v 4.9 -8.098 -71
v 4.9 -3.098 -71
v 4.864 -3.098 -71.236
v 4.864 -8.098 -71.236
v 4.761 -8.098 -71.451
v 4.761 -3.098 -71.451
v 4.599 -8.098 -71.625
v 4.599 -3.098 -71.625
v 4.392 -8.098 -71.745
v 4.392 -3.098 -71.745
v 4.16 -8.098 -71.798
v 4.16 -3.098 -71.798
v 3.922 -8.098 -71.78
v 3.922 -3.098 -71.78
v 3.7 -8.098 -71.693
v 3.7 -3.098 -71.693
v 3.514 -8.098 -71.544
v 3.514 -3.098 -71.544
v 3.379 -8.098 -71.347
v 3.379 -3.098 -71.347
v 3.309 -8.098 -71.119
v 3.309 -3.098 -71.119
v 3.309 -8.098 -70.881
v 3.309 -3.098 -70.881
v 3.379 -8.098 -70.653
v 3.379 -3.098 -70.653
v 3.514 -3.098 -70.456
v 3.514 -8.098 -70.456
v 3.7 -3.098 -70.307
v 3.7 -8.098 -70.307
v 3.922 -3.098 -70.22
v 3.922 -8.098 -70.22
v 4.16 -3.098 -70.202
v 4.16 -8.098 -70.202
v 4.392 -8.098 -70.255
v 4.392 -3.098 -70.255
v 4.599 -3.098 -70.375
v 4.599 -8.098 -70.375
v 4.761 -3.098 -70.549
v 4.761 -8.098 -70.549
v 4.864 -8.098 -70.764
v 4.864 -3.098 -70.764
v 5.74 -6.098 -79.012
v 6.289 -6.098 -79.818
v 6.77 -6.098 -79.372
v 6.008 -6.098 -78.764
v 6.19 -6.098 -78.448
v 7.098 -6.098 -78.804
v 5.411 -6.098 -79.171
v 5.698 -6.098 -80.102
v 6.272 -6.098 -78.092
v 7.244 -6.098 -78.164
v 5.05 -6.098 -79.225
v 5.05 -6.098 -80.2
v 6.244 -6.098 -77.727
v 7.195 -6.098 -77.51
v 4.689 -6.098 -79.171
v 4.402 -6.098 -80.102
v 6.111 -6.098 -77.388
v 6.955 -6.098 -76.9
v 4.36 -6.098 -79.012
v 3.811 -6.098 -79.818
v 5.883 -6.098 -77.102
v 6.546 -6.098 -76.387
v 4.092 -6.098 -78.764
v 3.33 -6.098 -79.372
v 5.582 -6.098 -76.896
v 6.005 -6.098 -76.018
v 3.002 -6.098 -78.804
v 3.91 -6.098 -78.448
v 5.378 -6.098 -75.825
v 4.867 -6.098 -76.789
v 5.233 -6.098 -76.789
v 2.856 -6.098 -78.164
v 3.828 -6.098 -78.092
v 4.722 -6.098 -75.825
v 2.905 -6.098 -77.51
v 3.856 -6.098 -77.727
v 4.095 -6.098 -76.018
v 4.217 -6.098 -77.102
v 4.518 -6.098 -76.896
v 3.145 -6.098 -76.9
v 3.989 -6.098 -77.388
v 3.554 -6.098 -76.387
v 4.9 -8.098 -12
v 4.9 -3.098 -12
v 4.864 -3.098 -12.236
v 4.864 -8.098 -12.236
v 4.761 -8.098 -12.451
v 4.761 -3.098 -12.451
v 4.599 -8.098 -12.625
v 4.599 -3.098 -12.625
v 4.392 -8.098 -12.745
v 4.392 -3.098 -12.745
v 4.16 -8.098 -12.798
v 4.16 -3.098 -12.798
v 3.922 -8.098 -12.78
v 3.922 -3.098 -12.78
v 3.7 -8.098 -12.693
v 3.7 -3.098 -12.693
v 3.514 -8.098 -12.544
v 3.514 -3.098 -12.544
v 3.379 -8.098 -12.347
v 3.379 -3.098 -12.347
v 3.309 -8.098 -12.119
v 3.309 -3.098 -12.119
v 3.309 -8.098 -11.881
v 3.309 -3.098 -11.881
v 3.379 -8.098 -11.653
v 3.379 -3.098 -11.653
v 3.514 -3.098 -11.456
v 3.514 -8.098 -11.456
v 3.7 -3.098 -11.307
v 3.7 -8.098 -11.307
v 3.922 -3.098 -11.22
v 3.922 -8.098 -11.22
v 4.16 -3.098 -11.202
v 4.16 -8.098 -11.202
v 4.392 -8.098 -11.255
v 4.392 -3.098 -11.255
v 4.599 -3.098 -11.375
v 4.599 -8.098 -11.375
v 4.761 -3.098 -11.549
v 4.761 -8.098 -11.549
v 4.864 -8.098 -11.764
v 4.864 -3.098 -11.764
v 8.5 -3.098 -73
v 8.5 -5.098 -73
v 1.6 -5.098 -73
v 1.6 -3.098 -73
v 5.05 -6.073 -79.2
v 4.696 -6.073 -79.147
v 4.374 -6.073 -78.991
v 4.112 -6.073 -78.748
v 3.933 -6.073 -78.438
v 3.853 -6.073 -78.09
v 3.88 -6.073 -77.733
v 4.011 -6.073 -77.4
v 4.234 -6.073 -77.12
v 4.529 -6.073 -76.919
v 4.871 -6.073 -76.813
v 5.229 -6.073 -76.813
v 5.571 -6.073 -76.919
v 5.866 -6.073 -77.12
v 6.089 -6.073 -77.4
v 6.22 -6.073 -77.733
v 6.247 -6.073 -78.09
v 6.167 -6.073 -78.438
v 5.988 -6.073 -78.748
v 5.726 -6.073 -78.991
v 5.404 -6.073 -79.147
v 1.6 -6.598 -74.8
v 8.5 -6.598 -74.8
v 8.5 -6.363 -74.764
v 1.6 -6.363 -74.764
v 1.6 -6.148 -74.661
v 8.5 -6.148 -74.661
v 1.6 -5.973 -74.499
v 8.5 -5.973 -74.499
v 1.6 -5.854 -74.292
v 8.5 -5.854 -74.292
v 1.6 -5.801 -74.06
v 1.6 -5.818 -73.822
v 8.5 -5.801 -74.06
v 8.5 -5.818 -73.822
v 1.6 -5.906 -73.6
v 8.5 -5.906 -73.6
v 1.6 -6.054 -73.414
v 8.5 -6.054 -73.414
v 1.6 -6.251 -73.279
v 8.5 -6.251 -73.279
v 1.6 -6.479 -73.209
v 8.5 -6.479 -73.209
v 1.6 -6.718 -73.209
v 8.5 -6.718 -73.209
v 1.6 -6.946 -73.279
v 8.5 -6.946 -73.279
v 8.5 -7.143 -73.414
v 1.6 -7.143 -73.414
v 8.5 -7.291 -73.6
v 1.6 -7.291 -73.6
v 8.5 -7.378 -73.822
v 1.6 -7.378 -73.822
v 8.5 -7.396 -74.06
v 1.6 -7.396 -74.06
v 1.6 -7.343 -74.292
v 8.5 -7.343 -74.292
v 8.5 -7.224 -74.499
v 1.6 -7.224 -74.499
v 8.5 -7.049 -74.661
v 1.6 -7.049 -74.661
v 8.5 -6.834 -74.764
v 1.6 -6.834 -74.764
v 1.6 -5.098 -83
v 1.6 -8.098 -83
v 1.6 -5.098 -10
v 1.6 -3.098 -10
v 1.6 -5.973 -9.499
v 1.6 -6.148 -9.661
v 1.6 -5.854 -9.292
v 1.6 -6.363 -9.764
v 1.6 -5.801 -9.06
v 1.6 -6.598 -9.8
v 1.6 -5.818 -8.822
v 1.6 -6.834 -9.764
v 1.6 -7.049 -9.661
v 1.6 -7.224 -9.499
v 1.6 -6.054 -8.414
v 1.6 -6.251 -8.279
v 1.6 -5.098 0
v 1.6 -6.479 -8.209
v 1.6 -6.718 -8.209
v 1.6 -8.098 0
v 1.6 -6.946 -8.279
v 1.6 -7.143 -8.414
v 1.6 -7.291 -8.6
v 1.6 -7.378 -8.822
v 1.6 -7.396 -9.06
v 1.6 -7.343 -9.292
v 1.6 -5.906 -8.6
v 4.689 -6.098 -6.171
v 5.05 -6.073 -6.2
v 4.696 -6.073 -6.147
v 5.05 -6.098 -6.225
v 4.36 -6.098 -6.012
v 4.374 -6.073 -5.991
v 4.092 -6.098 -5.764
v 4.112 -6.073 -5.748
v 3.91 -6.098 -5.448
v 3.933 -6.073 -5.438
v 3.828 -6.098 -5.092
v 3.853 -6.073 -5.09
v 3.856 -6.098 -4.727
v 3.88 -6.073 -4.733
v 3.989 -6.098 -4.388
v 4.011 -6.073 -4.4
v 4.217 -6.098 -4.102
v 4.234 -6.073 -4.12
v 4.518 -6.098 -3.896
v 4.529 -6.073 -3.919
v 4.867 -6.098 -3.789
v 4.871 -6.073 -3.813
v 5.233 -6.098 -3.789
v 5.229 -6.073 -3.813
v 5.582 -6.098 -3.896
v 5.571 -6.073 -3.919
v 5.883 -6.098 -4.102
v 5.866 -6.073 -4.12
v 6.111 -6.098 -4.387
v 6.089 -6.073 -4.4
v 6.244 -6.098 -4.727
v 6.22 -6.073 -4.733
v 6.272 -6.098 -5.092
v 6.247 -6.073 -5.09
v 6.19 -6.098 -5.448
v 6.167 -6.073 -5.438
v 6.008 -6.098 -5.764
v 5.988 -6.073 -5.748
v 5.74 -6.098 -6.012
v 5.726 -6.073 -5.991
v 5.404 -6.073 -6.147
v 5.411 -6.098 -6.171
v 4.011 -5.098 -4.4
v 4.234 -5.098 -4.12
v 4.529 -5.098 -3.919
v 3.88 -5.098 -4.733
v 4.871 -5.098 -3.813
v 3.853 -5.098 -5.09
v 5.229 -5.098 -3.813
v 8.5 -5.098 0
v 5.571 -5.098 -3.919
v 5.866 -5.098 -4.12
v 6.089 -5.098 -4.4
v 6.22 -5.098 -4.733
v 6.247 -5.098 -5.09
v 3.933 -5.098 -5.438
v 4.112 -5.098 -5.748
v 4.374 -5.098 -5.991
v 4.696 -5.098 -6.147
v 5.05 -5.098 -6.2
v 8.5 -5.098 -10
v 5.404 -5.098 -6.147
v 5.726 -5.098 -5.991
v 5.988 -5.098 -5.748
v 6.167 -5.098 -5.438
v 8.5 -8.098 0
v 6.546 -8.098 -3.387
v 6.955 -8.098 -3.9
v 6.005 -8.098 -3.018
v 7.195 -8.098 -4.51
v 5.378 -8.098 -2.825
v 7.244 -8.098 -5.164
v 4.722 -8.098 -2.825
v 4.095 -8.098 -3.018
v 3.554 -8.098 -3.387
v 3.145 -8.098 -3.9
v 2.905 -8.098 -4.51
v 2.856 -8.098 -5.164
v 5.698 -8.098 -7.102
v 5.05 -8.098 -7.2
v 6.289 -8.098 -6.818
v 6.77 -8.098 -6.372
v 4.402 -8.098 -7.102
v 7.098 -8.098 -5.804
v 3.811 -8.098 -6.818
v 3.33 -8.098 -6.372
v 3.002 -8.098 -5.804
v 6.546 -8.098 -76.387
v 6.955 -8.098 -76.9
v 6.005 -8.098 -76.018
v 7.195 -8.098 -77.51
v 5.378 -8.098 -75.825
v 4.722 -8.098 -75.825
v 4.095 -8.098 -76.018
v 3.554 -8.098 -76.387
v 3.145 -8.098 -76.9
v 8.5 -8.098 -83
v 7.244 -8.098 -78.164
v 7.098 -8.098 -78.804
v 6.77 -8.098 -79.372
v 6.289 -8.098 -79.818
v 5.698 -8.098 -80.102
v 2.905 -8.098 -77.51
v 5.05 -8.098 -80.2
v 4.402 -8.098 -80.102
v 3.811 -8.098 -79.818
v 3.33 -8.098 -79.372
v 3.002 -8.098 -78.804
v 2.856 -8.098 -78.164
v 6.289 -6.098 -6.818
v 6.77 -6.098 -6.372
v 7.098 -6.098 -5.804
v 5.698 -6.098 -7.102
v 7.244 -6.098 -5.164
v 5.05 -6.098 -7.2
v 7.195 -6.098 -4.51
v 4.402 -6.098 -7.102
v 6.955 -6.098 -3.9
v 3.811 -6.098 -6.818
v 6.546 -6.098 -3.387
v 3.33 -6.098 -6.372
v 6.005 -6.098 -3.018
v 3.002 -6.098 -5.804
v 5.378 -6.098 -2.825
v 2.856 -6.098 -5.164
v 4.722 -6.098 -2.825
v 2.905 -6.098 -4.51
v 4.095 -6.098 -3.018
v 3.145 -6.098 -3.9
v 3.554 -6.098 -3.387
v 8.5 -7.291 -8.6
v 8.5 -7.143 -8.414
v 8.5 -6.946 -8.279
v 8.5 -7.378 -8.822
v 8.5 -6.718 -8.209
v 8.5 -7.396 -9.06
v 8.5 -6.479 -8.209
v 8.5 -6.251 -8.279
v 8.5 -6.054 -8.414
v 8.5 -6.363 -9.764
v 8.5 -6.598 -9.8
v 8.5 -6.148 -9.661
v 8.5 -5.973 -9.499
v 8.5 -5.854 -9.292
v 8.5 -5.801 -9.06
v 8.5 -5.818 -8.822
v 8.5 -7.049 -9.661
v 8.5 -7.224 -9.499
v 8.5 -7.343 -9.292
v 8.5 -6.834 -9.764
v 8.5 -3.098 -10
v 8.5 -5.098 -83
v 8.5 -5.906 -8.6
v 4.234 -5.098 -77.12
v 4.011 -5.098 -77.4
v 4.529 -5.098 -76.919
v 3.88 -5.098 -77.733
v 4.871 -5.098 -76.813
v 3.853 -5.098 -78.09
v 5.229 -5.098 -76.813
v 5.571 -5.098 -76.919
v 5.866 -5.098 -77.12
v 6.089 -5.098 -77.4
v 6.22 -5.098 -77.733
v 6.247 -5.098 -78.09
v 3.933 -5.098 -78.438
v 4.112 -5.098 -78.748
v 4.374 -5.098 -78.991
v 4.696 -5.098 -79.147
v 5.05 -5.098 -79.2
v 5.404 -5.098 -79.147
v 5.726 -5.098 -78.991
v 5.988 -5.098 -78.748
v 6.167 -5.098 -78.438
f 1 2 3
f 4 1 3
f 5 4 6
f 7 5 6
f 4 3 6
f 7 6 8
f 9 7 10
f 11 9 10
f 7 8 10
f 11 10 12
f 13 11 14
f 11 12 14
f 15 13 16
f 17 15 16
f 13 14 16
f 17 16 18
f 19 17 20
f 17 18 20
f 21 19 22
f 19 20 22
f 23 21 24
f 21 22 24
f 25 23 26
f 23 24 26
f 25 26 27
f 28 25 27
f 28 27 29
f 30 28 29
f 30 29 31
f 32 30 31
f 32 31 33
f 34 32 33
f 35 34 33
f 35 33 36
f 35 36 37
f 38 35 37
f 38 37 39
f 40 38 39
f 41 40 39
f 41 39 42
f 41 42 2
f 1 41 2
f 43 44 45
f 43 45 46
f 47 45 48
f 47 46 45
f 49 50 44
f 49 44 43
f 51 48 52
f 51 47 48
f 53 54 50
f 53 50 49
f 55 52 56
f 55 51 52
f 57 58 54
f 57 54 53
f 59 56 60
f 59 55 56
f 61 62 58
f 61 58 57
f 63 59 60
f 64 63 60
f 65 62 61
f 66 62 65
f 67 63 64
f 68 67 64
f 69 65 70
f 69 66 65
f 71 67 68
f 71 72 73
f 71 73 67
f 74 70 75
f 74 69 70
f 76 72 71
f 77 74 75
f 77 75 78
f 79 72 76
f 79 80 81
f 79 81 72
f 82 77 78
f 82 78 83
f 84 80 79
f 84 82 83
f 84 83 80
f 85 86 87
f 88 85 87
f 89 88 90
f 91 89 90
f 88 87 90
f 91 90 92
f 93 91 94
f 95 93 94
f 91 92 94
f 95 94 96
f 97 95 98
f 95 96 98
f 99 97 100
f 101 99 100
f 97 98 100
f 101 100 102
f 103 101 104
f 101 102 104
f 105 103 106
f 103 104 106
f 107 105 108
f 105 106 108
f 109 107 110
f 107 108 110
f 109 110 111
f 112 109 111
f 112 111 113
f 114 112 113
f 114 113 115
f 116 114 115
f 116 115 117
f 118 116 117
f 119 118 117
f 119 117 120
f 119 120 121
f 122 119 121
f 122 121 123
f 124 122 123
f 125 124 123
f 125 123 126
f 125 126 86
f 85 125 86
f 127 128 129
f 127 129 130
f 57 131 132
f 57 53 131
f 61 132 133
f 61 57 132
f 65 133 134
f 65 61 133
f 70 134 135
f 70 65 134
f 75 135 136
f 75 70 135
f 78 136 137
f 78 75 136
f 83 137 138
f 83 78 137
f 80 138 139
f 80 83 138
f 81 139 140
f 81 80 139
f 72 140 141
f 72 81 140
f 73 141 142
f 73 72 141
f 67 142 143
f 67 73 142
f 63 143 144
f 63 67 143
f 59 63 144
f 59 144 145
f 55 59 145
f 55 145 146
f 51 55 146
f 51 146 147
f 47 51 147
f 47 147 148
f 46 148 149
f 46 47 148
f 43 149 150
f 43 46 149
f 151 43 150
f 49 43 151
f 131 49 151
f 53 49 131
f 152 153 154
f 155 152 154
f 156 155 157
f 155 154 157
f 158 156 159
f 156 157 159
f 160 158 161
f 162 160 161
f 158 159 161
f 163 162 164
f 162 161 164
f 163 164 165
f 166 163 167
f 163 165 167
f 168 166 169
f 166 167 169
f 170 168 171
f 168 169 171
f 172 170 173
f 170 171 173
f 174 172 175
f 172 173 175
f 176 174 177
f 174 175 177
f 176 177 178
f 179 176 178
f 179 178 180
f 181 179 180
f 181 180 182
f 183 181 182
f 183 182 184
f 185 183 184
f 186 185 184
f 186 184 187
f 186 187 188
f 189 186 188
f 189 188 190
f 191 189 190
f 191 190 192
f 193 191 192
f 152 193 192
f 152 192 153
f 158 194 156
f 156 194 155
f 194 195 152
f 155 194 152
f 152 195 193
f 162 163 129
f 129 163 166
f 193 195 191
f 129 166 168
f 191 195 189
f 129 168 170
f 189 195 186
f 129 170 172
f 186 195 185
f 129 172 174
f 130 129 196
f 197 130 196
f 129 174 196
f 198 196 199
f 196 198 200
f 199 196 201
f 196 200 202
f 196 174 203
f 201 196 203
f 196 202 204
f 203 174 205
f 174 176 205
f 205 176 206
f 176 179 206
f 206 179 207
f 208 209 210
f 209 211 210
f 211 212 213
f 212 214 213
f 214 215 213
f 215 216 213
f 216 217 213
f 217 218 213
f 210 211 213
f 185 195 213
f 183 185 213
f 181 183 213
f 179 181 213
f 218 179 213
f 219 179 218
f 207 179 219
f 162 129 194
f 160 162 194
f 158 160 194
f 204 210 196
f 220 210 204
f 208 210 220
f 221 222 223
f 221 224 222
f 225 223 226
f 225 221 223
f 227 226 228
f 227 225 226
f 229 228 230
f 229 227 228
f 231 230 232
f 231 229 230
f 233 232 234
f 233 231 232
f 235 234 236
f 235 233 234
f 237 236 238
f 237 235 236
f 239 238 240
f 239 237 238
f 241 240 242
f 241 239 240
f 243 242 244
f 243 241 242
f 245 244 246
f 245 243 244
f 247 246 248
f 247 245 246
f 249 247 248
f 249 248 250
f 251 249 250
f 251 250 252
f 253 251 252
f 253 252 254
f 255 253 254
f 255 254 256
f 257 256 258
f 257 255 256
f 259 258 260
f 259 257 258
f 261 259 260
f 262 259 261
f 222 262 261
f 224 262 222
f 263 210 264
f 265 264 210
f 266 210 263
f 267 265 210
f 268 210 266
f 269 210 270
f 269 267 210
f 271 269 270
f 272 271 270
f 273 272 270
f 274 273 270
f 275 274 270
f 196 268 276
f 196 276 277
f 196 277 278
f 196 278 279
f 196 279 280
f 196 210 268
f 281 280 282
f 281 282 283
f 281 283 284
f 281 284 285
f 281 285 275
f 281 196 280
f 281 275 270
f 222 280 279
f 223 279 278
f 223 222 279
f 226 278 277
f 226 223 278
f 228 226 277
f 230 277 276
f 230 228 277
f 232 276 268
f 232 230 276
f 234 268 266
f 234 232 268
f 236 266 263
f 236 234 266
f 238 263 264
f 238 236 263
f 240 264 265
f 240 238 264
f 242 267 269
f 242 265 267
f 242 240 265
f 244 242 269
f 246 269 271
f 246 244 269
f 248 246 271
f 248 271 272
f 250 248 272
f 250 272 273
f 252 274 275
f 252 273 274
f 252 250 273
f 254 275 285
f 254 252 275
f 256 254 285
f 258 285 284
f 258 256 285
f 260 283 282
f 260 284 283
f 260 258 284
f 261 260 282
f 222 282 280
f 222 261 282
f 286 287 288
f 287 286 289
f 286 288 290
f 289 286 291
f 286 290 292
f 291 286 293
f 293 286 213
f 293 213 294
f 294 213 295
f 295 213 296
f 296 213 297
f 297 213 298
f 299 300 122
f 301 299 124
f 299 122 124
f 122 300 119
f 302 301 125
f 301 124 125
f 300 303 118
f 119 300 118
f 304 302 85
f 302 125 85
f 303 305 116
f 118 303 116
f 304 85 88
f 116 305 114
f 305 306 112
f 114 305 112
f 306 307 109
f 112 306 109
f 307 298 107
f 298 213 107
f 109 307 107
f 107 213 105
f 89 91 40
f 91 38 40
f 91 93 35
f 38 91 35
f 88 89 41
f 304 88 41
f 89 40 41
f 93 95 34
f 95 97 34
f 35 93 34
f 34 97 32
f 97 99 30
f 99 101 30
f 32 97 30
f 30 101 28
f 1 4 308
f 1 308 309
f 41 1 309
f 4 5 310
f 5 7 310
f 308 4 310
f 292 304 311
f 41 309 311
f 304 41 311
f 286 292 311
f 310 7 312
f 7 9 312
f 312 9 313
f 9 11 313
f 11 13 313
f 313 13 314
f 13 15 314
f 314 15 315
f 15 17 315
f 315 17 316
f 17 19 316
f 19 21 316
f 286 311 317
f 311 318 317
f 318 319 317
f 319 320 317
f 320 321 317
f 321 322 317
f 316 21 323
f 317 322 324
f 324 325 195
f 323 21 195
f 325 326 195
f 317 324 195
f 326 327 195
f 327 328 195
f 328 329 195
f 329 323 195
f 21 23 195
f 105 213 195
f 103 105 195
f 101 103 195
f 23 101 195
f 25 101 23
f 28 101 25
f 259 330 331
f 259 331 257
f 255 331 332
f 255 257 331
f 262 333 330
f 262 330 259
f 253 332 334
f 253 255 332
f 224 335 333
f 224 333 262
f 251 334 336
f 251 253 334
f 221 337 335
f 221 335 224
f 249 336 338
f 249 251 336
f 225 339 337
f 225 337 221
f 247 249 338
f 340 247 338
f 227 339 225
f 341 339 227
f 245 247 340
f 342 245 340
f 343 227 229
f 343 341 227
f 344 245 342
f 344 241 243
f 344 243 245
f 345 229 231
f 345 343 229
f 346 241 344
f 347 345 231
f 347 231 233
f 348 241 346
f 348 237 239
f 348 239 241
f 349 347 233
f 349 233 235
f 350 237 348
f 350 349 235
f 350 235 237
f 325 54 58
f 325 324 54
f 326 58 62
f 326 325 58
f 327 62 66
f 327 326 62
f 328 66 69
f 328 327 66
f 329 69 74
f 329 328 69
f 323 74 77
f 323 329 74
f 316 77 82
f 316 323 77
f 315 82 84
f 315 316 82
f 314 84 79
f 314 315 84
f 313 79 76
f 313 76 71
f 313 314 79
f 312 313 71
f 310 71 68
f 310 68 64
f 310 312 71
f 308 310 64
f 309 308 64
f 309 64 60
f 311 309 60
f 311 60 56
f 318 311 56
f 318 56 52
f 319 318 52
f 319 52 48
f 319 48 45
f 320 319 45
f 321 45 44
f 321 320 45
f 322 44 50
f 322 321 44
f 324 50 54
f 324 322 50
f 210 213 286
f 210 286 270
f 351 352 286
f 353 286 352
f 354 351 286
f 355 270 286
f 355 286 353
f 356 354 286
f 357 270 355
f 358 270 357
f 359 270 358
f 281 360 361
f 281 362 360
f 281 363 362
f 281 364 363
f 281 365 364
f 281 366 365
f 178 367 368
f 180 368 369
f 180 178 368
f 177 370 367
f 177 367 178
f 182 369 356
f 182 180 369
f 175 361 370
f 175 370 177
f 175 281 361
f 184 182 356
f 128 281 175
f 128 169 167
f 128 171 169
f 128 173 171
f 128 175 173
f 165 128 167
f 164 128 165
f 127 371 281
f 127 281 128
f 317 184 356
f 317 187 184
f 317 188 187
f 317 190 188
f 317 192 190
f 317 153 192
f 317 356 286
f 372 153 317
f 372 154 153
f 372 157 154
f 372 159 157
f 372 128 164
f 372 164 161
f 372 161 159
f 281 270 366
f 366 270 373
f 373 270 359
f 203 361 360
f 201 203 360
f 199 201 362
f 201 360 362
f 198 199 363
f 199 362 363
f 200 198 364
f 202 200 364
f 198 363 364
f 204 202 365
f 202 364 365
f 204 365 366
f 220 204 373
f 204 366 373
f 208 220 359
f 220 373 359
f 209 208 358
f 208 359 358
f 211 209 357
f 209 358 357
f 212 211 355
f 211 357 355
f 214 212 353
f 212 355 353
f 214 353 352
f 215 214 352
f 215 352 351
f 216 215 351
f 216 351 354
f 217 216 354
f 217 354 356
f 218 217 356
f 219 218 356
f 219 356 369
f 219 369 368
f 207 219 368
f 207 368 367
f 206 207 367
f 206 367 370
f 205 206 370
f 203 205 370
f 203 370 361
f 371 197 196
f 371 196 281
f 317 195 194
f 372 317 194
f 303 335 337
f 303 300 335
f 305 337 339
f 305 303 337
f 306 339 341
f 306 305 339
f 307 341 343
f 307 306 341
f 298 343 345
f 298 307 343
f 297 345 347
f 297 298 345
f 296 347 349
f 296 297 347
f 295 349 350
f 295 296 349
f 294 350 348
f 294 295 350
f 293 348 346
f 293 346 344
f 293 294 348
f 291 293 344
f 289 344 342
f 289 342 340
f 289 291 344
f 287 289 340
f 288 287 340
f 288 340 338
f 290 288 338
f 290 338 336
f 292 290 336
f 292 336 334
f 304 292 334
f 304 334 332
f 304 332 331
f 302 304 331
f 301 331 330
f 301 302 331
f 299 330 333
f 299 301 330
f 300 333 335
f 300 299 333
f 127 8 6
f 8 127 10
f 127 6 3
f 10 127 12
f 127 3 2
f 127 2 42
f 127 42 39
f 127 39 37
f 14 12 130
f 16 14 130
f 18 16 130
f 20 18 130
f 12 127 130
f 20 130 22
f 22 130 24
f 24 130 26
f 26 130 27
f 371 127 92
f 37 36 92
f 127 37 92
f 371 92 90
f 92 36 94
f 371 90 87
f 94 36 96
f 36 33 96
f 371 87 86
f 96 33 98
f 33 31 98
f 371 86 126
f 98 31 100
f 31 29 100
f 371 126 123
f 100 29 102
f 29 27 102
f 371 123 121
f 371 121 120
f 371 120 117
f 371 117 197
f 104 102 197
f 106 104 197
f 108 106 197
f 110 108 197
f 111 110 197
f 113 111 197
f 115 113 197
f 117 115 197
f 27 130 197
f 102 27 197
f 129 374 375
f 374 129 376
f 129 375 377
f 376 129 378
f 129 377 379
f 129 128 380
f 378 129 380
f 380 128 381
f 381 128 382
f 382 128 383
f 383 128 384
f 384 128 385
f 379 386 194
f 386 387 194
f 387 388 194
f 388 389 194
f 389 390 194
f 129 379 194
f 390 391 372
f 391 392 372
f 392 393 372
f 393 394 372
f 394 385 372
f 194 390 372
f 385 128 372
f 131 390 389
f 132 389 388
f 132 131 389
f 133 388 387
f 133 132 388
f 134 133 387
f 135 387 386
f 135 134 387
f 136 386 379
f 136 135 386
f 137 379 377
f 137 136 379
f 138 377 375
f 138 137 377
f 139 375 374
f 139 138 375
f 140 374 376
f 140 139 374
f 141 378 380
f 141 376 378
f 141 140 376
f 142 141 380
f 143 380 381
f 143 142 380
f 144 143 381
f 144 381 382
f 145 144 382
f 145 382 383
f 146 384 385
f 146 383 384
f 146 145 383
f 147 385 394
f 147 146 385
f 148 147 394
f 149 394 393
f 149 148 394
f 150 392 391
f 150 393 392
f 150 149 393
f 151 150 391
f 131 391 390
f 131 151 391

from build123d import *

# Parameters (mm, degrees)
SKETCH1_W                                      = 83
SKETCH1_H                                      = 6
BOSS_EXTRUDE1_DEPTH                            = 8.5
SKETCH7_W                                      = 8.5
SKETCH7_H                                      = 10
CUT_EXTRUDE6_DEPTH                             = 3
SKETCH18_W                                     = 10
SKETCH18_H                                     = 3
CUT_EXTRUDE8_DEPTH                             = 10
SKETCH21_W                                     = 63
SKETCH21_H                                     = 1
CUT_EXTRUDE9_DEPTH                             = 10
M2X0_4_TAPPED_HOLE3_D                          = 1.6
SKETCH27_W                                     = 1.6
SKETCH27_H                                     = 83
CUT_EXTRUDE12_DEPTH                            = 10
CBORE_FOR_M2_SOCKET_HEAD_CAP_SCREW1_AT_2_COUNT = 2
CBORE_FOR_M2_SOCKET_HEAD_CAP_SCREW1_AT_2_PITCH = 73
M2X0_4_TAPPED_HOLE2_D                          = 1.6


with BuildPart() as part:
    # Sketch1 → Boss-Extrude1 (new body)
    with BuildSketch(Plane(origin=(0, 0, 0), x_dir=(0, 0, -1), z_dir=(1, 0, 0))):
        with Locations((41.5, -5.098419508)):
            Rectangle(SKETCH1_W, SKETCH1_H)
    extrude(amount=BOSS_EXTRUDE1_DEPTH)

    # Sketch7 → Cut-Extrude6 (cut)
    with BuildSketch(Plane(origin=(0, -2.098419508, 0), x_dir=(1, 0, 0), z_dir=(0, 1, 0))):
        with Locations((4.25, 5)):
            Rectangle(SKETCH7_W, SKETCH7_H)
    extrude(amount=-CUT_EXTRUDE6_DEPTH, mode=Mode.SUBTRACT)

    # Sketch18 → Cut-Extrude8 (cut)
    with BuildSketch(Plane(origin=(8.5, 0, 0), x_dir=(0, 0, -1), z_dir=(1, 0, 0))):
        with Locations((78, -3.598419508)):
            Rectangle(SKETCH18_W, SKETCH18_H)
    extrude(amount=-CUT_EXTRUDE8_DEPTH, mode=Mode.SUBTRACT)

    # Sketch21 → Cut-Extrude9 (cut)
    with BuildSketch(Plane.ZY):
        with Locations((-41.5, -2.598419508)):
            Rectangle(SKETCH21_W, SKETCH21_H)
    extrude(amount=-CUT_EXTRUDE9_DEPTH, mode=Mode.SUBTRACT)

    # M2x0.4 Tapped Hole3 (through all)
    with Locations(Plane.ZY):
        with Locations((-74, -6.598419508), (-9, -6.598419508)):
            Hole(M2X0_4_TAPPED_HOLE3_D / 2)

    # Sketch27 → Cut-Extrude12 (cut)
    with BuildSketch(Plane.XZ.offset(8.098419508)):
        with Locations((0.8, -41.5)):
            Rectangle(SKETCH27_W, SKETCH27_H)
    extrude(amount=-CUT_EXTRUDE12_DEPTH, mode=Mode.SUBTRACT)

    # Sketch31 → CBORE for M2 Socket Head Cap Screw1 (revolve, cut)
    with BuildSketch(Plane(origin=(5.05, -8.098419508, -5), x_dir=(0, 0, -1), z_dir=(1, 0, 0))):
        Polygon((0, 0), (0, 5), (1.2, 5), (1.2, 2.025), (1.225, 2), (2.2, 2), (2.2, 0), align=None)
    cbore_for_m2_socket_head_cap_screw1 = revolve(axis=Axis((5.05, -14.448419508, -5), (0, 1, 0)), mode=Mode.SUBTRACT)

    # CBORE for M2 Socket Head Cap Screw1 at 2: CBORE for M2 Socket Head Cap Screw1 ×2
    with Locations(*[(0, 0, -i * CBORE_FOR_M2_SOCKET_HEAD_CAP_SCREW1_AT_2_PITCH) for i in range(1, CBORE_FOR_M2_SOCKET_HEAD_CAP_SCREW1_AT_2_COUNT)]):
        add(cbore_for_m2_socket_head_cap_screw1, mode=Mode.SUBTRACT)

    # M2x0.4 Tapped Hole2 (through all)
    with Locations(Plane(origin=(0, -8.098419508, 0), x_dir=(-1, 0, 0), z_dir=(0, -1, 0))):
        with Locations((-4.1, 71), (-4.1, 12)):
            Hole(M2X0_4_TAPPED_HOLE2_D / 2)


solid = part.part
